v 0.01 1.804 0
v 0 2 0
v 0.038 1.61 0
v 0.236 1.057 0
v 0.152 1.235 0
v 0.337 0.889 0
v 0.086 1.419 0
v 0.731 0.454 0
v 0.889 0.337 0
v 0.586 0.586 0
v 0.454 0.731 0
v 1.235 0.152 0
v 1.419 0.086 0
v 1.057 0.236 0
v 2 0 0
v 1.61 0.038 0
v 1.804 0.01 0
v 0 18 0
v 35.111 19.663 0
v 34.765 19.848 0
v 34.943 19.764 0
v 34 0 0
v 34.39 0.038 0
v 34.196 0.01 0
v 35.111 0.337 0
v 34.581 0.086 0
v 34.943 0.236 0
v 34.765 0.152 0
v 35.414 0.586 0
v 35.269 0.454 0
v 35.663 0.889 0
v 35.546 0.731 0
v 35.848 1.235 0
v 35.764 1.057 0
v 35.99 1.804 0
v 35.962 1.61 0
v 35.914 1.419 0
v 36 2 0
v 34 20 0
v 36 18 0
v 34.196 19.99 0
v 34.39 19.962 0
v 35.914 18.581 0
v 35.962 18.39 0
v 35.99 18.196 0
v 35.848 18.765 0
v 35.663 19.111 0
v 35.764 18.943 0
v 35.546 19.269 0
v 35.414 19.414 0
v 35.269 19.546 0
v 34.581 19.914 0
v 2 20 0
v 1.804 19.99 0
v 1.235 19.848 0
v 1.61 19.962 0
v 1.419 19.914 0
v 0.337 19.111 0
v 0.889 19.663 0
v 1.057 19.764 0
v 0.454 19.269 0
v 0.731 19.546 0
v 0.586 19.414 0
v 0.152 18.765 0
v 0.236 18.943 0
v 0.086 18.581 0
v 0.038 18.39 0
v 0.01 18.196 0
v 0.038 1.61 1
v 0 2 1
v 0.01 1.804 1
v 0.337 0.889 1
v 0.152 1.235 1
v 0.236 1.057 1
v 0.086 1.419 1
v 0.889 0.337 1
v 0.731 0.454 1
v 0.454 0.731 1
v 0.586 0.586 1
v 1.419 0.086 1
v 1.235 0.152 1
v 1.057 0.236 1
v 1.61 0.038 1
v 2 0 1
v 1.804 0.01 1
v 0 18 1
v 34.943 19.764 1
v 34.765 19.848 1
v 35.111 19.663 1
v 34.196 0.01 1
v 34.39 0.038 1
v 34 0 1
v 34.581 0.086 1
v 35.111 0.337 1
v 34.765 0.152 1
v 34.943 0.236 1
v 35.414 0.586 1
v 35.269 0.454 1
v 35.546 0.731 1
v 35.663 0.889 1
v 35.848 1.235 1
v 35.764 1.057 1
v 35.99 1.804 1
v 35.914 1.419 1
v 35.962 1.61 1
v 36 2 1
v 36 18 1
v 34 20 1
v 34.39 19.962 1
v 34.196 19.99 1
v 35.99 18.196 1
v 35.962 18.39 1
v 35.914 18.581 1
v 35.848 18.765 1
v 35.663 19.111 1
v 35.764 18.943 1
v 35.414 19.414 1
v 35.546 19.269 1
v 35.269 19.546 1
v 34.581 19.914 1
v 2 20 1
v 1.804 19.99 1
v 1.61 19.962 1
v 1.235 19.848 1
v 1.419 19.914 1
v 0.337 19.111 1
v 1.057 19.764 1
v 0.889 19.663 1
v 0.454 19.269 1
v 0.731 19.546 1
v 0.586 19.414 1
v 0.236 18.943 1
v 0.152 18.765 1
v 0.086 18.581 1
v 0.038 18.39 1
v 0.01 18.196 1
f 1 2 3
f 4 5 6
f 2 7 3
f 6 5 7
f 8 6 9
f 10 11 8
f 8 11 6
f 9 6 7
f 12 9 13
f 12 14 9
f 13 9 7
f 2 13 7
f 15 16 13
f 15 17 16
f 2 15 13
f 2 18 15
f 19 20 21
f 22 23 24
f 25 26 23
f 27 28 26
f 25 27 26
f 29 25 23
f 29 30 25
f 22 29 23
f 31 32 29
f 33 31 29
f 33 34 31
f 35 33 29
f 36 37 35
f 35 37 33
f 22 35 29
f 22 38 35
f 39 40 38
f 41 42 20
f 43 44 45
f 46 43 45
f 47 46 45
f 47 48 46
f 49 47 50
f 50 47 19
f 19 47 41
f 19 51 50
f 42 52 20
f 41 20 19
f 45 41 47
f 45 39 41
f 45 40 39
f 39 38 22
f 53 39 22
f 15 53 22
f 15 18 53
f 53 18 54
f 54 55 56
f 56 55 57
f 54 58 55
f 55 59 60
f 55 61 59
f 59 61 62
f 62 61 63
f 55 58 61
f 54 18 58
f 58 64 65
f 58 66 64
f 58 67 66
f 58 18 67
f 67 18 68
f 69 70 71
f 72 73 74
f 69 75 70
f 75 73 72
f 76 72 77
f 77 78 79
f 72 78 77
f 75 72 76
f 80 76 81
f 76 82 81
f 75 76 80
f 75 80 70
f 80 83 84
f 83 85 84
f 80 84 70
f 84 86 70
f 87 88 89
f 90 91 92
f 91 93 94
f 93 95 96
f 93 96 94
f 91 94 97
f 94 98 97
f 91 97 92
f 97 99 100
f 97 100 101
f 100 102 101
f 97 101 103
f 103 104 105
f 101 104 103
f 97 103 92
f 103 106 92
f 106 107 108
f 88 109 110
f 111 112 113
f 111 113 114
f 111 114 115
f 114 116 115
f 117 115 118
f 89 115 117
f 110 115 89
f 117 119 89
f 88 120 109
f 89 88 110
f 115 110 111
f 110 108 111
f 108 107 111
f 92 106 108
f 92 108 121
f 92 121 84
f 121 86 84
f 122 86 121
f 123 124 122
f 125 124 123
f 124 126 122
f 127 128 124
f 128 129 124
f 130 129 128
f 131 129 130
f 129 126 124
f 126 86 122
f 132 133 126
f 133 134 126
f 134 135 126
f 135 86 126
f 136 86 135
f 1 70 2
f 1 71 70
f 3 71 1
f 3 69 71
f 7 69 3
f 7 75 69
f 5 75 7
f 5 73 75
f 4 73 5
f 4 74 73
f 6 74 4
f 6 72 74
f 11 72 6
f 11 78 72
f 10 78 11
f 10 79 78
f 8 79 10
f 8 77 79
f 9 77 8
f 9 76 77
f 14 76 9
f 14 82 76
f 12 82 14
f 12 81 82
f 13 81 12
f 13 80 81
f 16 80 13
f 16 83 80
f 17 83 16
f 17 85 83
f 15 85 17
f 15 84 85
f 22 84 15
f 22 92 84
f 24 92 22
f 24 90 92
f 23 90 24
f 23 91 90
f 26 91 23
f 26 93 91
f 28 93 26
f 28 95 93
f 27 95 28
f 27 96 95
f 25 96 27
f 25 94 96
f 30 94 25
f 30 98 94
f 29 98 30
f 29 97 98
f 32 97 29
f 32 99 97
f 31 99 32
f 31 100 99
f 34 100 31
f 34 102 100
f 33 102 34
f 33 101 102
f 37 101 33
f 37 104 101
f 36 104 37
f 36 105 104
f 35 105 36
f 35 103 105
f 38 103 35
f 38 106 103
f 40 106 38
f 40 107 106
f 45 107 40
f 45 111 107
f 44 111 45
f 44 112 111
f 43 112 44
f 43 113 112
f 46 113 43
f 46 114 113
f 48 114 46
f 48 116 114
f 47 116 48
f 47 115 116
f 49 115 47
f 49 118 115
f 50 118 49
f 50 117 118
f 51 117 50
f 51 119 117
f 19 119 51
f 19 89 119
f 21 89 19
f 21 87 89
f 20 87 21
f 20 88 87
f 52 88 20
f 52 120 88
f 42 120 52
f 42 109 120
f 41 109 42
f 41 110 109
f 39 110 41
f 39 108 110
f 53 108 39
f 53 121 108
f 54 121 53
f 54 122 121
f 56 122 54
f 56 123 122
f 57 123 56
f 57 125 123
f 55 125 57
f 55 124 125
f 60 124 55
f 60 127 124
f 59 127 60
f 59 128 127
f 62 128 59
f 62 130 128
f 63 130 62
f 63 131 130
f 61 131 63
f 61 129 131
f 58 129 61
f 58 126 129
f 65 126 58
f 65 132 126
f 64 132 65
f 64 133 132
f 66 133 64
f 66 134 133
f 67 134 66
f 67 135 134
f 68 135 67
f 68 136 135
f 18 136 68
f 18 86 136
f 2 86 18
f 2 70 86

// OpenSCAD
$fn = $preview ? 8 : 64;

rcor=2;
x=36;
y=20;
z=1;
tekst="Oppå";
ramme=z/2;

module plate() {
    linear_extrude(z) {
        hull() {
            translate([rcor,rcor]) circle(r=rcor);
            translate([x-rcor,rcor]) circle(r=rcor);
            translate([rcor,y-rcor]) circle(r=rcor);
            translate([x-rcor,y-rcor]) circle(r=rcor);
        }
    }
}

module ramme() {
    linear_extrude(ramme) {
        difference() {
            hull() {
                translate([rcor,rcor]) circle(r=rcor);
                translate([x-rcor,rcor]) circle(r=rcor);
                translate([rcor,y-rcor]) circle(r=rcor);
                translate([x-rcor,y-rcor]) circle(r=rcor);
            }
            hull() {
                translate([rcor+ramme,rcor+ramme]) circle(r=rcor);
                translate([x-rcor-ramme,rcor+ramme]) circle(r=rcor);
                translate([rcor+ramme,y-rcor-ramme]) circle(r=rcor);
                translate([x-rcor-ramme,y-rcor-ramme]) circle(r=rcor);
            }
        }
    }
}

module tekst() {
    translate([x/10,y*.3]) {
        linear_extrude(z) {
            text(tekst, size=8);
        }
    }
}

plate();
//tekst();
//ramme();
